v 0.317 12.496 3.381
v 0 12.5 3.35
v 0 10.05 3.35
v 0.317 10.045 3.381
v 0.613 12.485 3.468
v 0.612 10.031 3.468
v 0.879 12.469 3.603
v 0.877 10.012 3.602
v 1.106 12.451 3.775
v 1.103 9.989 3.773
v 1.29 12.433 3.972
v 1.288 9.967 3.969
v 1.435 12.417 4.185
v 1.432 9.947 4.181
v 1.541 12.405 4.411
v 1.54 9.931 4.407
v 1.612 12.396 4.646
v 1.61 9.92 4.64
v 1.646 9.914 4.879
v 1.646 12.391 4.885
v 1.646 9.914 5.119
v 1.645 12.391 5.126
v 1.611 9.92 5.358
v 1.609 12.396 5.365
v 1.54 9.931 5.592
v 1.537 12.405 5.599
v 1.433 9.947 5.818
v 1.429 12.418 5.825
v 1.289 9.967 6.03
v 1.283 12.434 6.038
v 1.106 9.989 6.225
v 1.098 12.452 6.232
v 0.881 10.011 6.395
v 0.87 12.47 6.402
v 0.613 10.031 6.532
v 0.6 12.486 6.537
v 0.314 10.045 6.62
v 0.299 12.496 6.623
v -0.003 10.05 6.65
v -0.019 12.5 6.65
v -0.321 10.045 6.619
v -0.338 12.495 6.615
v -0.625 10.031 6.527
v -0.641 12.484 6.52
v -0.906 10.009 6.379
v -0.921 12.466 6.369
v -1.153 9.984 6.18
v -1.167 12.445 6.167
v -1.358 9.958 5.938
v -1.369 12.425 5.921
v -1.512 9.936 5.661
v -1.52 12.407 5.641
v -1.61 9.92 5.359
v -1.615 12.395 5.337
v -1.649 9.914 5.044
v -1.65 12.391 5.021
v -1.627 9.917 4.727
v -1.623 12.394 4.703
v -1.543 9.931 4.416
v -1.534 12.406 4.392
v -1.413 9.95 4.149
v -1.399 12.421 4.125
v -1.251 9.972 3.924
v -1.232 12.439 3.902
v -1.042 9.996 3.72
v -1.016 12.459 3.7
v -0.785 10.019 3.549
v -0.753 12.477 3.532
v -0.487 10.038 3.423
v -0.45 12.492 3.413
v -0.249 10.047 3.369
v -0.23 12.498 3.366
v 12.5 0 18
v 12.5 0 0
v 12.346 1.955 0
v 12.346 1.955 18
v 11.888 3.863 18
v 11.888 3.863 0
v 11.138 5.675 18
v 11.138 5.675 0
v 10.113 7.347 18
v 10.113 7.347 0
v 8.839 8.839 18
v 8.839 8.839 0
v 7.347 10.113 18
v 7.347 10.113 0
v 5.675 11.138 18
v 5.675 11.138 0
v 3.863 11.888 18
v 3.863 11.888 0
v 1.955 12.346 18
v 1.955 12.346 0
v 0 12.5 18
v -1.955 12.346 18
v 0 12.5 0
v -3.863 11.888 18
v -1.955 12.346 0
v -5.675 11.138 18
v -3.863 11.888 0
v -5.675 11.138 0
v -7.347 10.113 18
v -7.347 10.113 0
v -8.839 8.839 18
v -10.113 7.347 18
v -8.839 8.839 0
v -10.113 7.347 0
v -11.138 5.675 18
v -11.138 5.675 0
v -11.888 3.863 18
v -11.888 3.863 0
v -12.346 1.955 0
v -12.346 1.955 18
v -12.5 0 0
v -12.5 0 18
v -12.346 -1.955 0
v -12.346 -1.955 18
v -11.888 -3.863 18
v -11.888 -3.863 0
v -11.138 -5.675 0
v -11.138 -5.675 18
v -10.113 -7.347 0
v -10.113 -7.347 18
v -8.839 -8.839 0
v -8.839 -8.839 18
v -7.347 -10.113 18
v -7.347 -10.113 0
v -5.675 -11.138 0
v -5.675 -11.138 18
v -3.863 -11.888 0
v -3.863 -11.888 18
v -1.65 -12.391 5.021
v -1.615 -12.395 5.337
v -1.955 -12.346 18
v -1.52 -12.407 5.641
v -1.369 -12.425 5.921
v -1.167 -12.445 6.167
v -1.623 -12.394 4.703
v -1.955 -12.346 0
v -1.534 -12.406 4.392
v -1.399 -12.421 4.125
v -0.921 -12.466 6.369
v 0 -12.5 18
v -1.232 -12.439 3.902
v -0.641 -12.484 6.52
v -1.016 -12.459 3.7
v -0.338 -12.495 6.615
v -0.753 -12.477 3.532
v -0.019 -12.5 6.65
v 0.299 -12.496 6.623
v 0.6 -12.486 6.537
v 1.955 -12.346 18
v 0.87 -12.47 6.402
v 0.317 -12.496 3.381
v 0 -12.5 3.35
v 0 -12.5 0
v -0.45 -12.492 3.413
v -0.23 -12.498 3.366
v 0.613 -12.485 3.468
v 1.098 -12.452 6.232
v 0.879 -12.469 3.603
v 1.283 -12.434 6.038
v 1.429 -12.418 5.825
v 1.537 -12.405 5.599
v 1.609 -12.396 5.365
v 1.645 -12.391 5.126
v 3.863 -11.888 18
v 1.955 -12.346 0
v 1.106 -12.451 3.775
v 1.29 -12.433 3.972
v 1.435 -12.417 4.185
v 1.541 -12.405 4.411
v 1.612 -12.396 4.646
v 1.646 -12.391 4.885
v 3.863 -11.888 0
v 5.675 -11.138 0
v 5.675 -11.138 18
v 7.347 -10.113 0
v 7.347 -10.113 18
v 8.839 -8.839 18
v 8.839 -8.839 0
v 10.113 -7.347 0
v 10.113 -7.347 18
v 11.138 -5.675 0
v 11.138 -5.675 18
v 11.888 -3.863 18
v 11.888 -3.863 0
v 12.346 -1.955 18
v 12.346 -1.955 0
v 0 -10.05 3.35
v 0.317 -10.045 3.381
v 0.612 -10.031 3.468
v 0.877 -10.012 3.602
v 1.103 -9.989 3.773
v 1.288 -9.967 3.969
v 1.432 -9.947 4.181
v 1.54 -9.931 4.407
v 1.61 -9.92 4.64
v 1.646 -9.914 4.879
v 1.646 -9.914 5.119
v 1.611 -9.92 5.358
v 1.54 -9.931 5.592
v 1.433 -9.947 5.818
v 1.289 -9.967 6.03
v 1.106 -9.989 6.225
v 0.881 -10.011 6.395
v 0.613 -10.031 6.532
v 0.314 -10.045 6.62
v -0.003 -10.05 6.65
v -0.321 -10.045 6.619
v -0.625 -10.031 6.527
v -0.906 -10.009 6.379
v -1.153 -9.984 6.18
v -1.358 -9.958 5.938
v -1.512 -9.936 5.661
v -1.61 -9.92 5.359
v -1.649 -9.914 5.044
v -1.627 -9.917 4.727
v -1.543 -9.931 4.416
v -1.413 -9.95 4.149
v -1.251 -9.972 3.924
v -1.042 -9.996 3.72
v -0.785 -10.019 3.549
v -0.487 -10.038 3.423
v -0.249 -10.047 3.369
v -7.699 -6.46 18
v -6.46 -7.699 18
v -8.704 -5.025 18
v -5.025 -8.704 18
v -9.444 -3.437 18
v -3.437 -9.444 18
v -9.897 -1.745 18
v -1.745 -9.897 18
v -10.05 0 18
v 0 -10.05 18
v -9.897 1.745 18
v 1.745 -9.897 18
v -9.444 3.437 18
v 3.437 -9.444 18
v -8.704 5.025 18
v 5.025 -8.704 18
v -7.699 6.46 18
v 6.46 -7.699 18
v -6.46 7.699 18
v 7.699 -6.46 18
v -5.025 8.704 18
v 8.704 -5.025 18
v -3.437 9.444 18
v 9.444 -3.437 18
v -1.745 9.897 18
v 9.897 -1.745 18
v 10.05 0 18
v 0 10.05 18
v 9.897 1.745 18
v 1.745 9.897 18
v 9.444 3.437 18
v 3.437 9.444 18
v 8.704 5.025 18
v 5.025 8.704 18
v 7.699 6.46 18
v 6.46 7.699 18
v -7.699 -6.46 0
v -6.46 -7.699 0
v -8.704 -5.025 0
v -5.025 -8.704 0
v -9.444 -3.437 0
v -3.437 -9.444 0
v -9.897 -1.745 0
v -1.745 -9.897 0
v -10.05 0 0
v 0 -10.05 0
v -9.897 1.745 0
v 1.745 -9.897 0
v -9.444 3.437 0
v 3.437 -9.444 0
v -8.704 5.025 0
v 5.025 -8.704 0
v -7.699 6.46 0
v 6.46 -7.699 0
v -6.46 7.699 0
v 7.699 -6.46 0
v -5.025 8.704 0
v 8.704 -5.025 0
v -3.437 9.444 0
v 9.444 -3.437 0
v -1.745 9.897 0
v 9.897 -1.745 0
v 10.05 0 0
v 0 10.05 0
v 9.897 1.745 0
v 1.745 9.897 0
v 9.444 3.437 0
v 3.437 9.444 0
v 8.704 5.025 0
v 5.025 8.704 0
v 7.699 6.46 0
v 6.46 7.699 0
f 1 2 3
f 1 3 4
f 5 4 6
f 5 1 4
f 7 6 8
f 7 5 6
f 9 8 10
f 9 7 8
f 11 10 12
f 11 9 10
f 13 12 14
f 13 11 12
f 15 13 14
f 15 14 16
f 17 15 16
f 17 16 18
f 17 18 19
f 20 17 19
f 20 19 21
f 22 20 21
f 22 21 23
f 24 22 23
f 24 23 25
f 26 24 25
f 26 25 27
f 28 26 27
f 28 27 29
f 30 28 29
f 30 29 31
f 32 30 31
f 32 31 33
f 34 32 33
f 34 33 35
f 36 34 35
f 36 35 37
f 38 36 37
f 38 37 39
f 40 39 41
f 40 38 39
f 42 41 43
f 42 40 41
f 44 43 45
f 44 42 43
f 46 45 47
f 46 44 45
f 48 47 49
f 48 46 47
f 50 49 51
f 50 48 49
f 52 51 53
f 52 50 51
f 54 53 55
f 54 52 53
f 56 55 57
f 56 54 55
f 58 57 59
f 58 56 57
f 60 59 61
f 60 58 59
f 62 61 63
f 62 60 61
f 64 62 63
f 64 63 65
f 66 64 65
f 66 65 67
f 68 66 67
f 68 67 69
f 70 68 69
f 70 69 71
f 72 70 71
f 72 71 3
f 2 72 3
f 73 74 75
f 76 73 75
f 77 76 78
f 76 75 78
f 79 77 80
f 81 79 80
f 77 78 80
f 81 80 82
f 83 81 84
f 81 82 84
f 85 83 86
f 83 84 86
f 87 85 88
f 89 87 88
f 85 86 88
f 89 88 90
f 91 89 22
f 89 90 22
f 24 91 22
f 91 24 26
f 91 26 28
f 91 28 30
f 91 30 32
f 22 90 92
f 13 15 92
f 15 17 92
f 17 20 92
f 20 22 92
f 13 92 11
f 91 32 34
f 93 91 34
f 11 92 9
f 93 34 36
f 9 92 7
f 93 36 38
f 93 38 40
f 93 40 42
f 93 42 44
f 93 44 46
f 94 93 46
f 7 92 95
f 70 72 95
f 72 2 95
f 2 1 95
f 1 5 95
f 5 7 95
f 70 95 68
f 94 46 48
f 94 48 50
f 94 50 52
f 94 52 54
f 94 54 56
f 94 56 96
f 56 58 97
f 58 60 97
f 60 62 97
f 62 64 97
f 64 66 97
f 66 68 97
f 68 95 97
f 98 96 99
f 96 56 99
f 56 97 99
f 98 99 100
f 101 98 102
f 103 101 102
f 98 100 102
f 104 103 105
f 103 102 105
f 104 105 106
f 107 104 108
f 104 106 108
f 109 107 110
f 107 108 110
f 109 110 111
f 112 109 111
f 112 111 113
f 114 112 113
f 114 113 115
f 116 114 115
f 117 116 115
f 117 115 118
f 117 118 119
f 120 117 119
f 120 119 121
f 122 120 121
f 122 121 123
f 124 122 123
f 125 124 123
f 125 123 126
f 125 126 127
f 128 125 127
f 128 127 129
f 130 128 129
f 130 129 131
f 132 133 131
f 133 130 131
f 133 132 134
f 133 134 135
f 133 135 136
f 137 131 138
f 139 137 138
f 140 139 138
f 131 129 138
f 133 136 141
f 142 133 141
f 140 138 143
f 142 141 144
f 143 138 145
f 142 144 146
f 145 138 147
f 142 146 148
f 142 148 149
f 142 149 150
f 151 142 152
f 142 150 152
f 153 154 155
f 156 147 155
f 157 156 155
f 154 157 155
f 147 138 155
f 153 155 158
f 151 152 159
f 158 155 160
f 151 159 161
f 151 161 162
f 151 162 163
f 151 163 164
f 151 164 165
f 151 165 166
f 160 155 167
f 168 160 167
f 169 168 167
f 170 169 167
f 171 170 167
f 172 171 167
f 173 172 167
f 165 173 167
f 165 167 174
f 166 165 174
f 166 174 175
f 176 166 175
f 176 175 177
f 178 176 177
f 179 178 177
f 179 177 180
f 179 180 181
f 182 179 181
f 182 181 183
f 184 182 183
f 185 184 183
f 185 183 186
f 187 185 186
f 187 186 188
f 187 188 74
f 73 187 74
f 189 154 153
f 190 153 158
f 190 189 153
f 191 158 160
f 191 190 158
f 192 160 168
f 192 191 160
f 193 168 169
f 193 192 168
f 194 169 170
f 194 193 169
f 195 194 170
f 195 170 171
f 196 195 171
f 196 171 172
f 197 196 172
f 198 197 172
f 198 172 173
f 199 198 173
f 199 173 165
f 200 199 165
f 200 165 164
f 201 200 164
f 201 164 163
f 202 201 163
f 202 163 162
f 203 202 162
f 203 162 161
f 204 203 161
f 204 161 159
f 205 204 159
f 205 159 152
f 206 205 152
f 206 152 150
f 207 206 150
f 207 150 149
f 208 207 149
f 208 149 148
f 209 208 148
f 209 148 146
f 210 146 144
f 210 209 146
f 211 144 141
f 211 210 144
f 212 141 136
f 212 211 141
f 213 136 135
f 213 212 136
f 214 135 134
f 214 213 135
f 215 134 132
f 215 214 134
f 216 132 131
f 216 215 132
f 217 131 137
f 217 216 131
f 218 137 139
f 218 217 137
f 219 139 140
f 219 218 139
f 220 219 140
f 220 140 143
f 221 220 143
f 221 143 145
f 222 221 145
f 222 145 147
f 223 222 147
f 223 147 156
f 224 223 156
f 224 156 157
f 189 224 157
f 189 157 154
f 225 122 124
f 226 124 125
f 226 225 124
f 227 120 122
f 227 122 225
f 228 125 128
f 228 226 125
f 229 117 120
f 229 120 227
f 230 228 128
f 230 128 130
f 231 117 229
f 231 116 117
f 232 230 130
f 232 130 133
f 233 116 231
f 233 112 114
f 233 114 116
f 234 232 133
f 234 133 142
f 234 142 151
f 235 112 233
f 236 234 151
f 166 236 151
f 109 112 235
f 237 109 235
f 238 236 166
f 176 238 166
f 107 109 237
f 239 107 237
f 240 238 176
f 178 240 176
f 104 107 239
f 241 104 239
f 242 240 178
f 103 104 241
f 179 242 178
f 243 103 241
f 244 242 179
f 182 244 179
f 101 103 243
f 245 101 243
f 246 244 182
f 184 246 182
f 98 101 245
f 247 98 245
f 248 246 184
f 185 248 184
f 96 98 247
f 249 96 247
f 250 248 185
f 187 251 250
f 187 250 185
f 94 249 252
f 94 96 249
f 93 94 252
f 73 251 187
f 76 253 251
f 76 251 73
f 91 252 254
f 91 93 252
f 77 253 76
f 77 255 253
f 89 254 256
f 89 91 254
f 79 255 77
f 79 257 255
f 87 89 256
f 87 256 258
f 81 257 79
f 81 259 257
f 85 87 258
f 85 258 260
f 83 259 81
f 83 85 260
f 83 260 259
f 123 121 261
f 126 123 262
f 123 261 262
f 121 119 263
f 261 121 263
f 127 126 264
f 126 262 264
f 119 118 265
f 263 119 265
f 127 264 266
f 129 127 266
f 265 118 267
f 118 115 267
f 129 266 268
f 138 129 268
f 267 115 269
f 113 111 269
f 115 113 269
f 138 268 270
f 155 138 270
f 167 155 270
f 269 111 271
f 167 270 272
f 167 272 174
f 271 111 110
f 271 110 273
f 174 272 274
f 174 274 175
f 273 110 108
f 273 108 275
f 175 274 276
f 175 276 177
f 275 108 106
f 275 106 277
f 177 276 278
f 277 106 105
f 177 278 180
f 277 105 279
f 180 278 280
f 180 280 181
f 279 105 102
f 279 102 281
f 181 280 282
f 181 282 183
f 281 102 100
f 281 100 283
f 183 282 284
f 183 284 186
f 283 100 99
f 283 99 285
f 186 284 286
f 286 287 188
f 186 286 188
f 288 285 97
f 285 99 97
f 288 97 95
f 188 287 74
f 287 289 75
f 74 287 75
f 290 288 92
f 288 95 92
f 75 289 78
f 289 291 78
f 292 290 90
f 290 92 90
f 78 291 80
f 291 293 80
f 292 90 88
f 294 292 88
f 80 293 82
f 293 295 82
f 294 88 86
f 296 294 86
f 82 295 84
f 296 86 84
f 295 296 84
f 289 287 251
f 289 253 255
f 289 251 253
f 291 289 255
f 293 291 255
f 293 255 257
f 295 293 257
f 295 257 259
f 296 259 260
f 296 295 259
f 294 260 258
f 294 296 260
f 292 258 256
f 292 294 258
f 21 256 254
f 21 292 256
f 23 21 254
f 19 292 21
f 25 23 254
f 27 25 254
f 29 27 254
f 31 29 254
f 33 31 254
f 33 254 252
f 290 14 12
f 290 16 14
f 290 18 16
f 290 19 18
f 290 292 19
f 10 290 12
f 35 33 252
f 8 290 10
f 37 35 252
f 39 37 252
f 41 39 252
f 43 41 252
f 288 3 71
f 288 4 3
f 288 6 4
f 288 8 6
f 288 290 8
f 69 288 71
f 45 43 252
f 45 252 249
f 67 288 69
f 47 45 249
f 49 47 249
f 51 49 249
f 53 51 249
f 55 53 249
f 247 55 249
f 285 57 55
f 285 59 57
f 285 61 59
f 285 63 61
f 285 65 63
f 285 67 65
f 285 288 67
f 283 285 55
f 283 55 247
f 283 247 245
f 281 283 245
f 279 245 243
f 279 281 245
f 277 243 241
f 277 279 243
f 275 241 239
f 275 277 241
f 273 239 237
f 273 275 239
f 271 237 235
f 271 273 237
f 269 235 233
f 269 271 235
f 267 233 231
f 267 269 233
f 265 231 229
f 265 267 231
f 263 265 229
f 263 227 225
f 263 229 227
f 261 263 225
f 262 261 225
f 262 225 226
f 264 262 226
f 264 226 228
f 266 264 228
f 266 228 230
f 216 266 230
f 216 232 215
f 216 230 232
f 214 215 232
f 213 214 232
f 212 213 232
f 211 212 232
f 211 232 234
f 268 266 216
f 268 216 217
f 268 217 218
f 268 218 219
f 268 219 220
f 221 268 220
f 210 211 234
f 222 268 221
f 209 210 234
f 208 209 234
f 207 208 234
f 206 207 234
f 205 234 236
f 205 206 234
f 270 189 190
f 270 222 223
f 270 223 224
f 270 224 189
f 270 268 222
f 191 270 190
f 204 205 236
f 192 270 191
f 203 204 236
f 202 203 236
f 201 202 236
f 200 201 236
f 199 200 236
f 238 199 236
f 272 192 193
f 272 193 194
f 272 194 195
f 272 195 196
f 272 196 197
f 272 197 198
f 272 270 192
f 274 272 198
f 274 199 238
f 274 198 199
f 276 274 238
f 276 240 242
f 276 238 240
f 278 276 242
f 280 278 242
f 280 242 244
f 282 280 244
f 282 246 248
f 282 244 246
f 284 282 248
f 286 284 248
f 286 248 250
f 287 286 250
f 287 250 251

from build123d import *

# Parameters (mm, degrees)
SKETCH1_R               = 12.5
BOSS_EXTRUDE1_DEPTH     = 18
CUT_EXTRUDE1_DEPTH      = 26.228951623
CUT_EXTRUDE1_DEPTH_BACK = 26.228951623
SKETCH2_R               = 10.05
CUT_EXTRUDE2_DEPTH      = 34.24530042
CUT_EXTRUDE2_DEPTH_BACK = 34.24530042
SKETCH6_R               = 1.65


with BuildPart() as part:
    # Sketch1 → Boss-Extrude1 (new body)
    with BuildSketch(Plane.XY):
        Circle(SKETCH1_R)
    extrude(amount=BOSS_EXTRUDE1_DEPTH)

    # Sketch2 → Cut-Extrude1 (cut, two sides: drawn at the far end of the back side and taken through both)
    with BuildSketch(Plane.XY.offset(18).offset(-CUT_EXTRUDE1_DEPTH_BACK)):
        Circle(SKETCH2_R)
    extrude(amount=CUT_EXTRUDE1_DEPTH + CUT_EXTRUDE1_DEPTH_BACK, mode=Mode.SUBTRACT)

    # Sketch6 → Cut-Extrude2 (cut, two sides: drawn at the far end of the back side and taken through both)
    with BuildSketch(Plane(origin=(0, -12.5, 0), x_dir=(-1, 0, 0), z_dir=(0, -1, 0)).offset(-CUT_EXTRUDE2_DEPTH_BACK)):
        with Locations(Location((0, -5, 0), (0, 0, 90))):
            Circle(SKETCH6_R)
    extrude(amount=CUT_EXTRUDE2_DEPTH + CUT_EXTRUDE2_DEPTH_BACK, mode=Mode.SUBTRACT)


solid = part.part
